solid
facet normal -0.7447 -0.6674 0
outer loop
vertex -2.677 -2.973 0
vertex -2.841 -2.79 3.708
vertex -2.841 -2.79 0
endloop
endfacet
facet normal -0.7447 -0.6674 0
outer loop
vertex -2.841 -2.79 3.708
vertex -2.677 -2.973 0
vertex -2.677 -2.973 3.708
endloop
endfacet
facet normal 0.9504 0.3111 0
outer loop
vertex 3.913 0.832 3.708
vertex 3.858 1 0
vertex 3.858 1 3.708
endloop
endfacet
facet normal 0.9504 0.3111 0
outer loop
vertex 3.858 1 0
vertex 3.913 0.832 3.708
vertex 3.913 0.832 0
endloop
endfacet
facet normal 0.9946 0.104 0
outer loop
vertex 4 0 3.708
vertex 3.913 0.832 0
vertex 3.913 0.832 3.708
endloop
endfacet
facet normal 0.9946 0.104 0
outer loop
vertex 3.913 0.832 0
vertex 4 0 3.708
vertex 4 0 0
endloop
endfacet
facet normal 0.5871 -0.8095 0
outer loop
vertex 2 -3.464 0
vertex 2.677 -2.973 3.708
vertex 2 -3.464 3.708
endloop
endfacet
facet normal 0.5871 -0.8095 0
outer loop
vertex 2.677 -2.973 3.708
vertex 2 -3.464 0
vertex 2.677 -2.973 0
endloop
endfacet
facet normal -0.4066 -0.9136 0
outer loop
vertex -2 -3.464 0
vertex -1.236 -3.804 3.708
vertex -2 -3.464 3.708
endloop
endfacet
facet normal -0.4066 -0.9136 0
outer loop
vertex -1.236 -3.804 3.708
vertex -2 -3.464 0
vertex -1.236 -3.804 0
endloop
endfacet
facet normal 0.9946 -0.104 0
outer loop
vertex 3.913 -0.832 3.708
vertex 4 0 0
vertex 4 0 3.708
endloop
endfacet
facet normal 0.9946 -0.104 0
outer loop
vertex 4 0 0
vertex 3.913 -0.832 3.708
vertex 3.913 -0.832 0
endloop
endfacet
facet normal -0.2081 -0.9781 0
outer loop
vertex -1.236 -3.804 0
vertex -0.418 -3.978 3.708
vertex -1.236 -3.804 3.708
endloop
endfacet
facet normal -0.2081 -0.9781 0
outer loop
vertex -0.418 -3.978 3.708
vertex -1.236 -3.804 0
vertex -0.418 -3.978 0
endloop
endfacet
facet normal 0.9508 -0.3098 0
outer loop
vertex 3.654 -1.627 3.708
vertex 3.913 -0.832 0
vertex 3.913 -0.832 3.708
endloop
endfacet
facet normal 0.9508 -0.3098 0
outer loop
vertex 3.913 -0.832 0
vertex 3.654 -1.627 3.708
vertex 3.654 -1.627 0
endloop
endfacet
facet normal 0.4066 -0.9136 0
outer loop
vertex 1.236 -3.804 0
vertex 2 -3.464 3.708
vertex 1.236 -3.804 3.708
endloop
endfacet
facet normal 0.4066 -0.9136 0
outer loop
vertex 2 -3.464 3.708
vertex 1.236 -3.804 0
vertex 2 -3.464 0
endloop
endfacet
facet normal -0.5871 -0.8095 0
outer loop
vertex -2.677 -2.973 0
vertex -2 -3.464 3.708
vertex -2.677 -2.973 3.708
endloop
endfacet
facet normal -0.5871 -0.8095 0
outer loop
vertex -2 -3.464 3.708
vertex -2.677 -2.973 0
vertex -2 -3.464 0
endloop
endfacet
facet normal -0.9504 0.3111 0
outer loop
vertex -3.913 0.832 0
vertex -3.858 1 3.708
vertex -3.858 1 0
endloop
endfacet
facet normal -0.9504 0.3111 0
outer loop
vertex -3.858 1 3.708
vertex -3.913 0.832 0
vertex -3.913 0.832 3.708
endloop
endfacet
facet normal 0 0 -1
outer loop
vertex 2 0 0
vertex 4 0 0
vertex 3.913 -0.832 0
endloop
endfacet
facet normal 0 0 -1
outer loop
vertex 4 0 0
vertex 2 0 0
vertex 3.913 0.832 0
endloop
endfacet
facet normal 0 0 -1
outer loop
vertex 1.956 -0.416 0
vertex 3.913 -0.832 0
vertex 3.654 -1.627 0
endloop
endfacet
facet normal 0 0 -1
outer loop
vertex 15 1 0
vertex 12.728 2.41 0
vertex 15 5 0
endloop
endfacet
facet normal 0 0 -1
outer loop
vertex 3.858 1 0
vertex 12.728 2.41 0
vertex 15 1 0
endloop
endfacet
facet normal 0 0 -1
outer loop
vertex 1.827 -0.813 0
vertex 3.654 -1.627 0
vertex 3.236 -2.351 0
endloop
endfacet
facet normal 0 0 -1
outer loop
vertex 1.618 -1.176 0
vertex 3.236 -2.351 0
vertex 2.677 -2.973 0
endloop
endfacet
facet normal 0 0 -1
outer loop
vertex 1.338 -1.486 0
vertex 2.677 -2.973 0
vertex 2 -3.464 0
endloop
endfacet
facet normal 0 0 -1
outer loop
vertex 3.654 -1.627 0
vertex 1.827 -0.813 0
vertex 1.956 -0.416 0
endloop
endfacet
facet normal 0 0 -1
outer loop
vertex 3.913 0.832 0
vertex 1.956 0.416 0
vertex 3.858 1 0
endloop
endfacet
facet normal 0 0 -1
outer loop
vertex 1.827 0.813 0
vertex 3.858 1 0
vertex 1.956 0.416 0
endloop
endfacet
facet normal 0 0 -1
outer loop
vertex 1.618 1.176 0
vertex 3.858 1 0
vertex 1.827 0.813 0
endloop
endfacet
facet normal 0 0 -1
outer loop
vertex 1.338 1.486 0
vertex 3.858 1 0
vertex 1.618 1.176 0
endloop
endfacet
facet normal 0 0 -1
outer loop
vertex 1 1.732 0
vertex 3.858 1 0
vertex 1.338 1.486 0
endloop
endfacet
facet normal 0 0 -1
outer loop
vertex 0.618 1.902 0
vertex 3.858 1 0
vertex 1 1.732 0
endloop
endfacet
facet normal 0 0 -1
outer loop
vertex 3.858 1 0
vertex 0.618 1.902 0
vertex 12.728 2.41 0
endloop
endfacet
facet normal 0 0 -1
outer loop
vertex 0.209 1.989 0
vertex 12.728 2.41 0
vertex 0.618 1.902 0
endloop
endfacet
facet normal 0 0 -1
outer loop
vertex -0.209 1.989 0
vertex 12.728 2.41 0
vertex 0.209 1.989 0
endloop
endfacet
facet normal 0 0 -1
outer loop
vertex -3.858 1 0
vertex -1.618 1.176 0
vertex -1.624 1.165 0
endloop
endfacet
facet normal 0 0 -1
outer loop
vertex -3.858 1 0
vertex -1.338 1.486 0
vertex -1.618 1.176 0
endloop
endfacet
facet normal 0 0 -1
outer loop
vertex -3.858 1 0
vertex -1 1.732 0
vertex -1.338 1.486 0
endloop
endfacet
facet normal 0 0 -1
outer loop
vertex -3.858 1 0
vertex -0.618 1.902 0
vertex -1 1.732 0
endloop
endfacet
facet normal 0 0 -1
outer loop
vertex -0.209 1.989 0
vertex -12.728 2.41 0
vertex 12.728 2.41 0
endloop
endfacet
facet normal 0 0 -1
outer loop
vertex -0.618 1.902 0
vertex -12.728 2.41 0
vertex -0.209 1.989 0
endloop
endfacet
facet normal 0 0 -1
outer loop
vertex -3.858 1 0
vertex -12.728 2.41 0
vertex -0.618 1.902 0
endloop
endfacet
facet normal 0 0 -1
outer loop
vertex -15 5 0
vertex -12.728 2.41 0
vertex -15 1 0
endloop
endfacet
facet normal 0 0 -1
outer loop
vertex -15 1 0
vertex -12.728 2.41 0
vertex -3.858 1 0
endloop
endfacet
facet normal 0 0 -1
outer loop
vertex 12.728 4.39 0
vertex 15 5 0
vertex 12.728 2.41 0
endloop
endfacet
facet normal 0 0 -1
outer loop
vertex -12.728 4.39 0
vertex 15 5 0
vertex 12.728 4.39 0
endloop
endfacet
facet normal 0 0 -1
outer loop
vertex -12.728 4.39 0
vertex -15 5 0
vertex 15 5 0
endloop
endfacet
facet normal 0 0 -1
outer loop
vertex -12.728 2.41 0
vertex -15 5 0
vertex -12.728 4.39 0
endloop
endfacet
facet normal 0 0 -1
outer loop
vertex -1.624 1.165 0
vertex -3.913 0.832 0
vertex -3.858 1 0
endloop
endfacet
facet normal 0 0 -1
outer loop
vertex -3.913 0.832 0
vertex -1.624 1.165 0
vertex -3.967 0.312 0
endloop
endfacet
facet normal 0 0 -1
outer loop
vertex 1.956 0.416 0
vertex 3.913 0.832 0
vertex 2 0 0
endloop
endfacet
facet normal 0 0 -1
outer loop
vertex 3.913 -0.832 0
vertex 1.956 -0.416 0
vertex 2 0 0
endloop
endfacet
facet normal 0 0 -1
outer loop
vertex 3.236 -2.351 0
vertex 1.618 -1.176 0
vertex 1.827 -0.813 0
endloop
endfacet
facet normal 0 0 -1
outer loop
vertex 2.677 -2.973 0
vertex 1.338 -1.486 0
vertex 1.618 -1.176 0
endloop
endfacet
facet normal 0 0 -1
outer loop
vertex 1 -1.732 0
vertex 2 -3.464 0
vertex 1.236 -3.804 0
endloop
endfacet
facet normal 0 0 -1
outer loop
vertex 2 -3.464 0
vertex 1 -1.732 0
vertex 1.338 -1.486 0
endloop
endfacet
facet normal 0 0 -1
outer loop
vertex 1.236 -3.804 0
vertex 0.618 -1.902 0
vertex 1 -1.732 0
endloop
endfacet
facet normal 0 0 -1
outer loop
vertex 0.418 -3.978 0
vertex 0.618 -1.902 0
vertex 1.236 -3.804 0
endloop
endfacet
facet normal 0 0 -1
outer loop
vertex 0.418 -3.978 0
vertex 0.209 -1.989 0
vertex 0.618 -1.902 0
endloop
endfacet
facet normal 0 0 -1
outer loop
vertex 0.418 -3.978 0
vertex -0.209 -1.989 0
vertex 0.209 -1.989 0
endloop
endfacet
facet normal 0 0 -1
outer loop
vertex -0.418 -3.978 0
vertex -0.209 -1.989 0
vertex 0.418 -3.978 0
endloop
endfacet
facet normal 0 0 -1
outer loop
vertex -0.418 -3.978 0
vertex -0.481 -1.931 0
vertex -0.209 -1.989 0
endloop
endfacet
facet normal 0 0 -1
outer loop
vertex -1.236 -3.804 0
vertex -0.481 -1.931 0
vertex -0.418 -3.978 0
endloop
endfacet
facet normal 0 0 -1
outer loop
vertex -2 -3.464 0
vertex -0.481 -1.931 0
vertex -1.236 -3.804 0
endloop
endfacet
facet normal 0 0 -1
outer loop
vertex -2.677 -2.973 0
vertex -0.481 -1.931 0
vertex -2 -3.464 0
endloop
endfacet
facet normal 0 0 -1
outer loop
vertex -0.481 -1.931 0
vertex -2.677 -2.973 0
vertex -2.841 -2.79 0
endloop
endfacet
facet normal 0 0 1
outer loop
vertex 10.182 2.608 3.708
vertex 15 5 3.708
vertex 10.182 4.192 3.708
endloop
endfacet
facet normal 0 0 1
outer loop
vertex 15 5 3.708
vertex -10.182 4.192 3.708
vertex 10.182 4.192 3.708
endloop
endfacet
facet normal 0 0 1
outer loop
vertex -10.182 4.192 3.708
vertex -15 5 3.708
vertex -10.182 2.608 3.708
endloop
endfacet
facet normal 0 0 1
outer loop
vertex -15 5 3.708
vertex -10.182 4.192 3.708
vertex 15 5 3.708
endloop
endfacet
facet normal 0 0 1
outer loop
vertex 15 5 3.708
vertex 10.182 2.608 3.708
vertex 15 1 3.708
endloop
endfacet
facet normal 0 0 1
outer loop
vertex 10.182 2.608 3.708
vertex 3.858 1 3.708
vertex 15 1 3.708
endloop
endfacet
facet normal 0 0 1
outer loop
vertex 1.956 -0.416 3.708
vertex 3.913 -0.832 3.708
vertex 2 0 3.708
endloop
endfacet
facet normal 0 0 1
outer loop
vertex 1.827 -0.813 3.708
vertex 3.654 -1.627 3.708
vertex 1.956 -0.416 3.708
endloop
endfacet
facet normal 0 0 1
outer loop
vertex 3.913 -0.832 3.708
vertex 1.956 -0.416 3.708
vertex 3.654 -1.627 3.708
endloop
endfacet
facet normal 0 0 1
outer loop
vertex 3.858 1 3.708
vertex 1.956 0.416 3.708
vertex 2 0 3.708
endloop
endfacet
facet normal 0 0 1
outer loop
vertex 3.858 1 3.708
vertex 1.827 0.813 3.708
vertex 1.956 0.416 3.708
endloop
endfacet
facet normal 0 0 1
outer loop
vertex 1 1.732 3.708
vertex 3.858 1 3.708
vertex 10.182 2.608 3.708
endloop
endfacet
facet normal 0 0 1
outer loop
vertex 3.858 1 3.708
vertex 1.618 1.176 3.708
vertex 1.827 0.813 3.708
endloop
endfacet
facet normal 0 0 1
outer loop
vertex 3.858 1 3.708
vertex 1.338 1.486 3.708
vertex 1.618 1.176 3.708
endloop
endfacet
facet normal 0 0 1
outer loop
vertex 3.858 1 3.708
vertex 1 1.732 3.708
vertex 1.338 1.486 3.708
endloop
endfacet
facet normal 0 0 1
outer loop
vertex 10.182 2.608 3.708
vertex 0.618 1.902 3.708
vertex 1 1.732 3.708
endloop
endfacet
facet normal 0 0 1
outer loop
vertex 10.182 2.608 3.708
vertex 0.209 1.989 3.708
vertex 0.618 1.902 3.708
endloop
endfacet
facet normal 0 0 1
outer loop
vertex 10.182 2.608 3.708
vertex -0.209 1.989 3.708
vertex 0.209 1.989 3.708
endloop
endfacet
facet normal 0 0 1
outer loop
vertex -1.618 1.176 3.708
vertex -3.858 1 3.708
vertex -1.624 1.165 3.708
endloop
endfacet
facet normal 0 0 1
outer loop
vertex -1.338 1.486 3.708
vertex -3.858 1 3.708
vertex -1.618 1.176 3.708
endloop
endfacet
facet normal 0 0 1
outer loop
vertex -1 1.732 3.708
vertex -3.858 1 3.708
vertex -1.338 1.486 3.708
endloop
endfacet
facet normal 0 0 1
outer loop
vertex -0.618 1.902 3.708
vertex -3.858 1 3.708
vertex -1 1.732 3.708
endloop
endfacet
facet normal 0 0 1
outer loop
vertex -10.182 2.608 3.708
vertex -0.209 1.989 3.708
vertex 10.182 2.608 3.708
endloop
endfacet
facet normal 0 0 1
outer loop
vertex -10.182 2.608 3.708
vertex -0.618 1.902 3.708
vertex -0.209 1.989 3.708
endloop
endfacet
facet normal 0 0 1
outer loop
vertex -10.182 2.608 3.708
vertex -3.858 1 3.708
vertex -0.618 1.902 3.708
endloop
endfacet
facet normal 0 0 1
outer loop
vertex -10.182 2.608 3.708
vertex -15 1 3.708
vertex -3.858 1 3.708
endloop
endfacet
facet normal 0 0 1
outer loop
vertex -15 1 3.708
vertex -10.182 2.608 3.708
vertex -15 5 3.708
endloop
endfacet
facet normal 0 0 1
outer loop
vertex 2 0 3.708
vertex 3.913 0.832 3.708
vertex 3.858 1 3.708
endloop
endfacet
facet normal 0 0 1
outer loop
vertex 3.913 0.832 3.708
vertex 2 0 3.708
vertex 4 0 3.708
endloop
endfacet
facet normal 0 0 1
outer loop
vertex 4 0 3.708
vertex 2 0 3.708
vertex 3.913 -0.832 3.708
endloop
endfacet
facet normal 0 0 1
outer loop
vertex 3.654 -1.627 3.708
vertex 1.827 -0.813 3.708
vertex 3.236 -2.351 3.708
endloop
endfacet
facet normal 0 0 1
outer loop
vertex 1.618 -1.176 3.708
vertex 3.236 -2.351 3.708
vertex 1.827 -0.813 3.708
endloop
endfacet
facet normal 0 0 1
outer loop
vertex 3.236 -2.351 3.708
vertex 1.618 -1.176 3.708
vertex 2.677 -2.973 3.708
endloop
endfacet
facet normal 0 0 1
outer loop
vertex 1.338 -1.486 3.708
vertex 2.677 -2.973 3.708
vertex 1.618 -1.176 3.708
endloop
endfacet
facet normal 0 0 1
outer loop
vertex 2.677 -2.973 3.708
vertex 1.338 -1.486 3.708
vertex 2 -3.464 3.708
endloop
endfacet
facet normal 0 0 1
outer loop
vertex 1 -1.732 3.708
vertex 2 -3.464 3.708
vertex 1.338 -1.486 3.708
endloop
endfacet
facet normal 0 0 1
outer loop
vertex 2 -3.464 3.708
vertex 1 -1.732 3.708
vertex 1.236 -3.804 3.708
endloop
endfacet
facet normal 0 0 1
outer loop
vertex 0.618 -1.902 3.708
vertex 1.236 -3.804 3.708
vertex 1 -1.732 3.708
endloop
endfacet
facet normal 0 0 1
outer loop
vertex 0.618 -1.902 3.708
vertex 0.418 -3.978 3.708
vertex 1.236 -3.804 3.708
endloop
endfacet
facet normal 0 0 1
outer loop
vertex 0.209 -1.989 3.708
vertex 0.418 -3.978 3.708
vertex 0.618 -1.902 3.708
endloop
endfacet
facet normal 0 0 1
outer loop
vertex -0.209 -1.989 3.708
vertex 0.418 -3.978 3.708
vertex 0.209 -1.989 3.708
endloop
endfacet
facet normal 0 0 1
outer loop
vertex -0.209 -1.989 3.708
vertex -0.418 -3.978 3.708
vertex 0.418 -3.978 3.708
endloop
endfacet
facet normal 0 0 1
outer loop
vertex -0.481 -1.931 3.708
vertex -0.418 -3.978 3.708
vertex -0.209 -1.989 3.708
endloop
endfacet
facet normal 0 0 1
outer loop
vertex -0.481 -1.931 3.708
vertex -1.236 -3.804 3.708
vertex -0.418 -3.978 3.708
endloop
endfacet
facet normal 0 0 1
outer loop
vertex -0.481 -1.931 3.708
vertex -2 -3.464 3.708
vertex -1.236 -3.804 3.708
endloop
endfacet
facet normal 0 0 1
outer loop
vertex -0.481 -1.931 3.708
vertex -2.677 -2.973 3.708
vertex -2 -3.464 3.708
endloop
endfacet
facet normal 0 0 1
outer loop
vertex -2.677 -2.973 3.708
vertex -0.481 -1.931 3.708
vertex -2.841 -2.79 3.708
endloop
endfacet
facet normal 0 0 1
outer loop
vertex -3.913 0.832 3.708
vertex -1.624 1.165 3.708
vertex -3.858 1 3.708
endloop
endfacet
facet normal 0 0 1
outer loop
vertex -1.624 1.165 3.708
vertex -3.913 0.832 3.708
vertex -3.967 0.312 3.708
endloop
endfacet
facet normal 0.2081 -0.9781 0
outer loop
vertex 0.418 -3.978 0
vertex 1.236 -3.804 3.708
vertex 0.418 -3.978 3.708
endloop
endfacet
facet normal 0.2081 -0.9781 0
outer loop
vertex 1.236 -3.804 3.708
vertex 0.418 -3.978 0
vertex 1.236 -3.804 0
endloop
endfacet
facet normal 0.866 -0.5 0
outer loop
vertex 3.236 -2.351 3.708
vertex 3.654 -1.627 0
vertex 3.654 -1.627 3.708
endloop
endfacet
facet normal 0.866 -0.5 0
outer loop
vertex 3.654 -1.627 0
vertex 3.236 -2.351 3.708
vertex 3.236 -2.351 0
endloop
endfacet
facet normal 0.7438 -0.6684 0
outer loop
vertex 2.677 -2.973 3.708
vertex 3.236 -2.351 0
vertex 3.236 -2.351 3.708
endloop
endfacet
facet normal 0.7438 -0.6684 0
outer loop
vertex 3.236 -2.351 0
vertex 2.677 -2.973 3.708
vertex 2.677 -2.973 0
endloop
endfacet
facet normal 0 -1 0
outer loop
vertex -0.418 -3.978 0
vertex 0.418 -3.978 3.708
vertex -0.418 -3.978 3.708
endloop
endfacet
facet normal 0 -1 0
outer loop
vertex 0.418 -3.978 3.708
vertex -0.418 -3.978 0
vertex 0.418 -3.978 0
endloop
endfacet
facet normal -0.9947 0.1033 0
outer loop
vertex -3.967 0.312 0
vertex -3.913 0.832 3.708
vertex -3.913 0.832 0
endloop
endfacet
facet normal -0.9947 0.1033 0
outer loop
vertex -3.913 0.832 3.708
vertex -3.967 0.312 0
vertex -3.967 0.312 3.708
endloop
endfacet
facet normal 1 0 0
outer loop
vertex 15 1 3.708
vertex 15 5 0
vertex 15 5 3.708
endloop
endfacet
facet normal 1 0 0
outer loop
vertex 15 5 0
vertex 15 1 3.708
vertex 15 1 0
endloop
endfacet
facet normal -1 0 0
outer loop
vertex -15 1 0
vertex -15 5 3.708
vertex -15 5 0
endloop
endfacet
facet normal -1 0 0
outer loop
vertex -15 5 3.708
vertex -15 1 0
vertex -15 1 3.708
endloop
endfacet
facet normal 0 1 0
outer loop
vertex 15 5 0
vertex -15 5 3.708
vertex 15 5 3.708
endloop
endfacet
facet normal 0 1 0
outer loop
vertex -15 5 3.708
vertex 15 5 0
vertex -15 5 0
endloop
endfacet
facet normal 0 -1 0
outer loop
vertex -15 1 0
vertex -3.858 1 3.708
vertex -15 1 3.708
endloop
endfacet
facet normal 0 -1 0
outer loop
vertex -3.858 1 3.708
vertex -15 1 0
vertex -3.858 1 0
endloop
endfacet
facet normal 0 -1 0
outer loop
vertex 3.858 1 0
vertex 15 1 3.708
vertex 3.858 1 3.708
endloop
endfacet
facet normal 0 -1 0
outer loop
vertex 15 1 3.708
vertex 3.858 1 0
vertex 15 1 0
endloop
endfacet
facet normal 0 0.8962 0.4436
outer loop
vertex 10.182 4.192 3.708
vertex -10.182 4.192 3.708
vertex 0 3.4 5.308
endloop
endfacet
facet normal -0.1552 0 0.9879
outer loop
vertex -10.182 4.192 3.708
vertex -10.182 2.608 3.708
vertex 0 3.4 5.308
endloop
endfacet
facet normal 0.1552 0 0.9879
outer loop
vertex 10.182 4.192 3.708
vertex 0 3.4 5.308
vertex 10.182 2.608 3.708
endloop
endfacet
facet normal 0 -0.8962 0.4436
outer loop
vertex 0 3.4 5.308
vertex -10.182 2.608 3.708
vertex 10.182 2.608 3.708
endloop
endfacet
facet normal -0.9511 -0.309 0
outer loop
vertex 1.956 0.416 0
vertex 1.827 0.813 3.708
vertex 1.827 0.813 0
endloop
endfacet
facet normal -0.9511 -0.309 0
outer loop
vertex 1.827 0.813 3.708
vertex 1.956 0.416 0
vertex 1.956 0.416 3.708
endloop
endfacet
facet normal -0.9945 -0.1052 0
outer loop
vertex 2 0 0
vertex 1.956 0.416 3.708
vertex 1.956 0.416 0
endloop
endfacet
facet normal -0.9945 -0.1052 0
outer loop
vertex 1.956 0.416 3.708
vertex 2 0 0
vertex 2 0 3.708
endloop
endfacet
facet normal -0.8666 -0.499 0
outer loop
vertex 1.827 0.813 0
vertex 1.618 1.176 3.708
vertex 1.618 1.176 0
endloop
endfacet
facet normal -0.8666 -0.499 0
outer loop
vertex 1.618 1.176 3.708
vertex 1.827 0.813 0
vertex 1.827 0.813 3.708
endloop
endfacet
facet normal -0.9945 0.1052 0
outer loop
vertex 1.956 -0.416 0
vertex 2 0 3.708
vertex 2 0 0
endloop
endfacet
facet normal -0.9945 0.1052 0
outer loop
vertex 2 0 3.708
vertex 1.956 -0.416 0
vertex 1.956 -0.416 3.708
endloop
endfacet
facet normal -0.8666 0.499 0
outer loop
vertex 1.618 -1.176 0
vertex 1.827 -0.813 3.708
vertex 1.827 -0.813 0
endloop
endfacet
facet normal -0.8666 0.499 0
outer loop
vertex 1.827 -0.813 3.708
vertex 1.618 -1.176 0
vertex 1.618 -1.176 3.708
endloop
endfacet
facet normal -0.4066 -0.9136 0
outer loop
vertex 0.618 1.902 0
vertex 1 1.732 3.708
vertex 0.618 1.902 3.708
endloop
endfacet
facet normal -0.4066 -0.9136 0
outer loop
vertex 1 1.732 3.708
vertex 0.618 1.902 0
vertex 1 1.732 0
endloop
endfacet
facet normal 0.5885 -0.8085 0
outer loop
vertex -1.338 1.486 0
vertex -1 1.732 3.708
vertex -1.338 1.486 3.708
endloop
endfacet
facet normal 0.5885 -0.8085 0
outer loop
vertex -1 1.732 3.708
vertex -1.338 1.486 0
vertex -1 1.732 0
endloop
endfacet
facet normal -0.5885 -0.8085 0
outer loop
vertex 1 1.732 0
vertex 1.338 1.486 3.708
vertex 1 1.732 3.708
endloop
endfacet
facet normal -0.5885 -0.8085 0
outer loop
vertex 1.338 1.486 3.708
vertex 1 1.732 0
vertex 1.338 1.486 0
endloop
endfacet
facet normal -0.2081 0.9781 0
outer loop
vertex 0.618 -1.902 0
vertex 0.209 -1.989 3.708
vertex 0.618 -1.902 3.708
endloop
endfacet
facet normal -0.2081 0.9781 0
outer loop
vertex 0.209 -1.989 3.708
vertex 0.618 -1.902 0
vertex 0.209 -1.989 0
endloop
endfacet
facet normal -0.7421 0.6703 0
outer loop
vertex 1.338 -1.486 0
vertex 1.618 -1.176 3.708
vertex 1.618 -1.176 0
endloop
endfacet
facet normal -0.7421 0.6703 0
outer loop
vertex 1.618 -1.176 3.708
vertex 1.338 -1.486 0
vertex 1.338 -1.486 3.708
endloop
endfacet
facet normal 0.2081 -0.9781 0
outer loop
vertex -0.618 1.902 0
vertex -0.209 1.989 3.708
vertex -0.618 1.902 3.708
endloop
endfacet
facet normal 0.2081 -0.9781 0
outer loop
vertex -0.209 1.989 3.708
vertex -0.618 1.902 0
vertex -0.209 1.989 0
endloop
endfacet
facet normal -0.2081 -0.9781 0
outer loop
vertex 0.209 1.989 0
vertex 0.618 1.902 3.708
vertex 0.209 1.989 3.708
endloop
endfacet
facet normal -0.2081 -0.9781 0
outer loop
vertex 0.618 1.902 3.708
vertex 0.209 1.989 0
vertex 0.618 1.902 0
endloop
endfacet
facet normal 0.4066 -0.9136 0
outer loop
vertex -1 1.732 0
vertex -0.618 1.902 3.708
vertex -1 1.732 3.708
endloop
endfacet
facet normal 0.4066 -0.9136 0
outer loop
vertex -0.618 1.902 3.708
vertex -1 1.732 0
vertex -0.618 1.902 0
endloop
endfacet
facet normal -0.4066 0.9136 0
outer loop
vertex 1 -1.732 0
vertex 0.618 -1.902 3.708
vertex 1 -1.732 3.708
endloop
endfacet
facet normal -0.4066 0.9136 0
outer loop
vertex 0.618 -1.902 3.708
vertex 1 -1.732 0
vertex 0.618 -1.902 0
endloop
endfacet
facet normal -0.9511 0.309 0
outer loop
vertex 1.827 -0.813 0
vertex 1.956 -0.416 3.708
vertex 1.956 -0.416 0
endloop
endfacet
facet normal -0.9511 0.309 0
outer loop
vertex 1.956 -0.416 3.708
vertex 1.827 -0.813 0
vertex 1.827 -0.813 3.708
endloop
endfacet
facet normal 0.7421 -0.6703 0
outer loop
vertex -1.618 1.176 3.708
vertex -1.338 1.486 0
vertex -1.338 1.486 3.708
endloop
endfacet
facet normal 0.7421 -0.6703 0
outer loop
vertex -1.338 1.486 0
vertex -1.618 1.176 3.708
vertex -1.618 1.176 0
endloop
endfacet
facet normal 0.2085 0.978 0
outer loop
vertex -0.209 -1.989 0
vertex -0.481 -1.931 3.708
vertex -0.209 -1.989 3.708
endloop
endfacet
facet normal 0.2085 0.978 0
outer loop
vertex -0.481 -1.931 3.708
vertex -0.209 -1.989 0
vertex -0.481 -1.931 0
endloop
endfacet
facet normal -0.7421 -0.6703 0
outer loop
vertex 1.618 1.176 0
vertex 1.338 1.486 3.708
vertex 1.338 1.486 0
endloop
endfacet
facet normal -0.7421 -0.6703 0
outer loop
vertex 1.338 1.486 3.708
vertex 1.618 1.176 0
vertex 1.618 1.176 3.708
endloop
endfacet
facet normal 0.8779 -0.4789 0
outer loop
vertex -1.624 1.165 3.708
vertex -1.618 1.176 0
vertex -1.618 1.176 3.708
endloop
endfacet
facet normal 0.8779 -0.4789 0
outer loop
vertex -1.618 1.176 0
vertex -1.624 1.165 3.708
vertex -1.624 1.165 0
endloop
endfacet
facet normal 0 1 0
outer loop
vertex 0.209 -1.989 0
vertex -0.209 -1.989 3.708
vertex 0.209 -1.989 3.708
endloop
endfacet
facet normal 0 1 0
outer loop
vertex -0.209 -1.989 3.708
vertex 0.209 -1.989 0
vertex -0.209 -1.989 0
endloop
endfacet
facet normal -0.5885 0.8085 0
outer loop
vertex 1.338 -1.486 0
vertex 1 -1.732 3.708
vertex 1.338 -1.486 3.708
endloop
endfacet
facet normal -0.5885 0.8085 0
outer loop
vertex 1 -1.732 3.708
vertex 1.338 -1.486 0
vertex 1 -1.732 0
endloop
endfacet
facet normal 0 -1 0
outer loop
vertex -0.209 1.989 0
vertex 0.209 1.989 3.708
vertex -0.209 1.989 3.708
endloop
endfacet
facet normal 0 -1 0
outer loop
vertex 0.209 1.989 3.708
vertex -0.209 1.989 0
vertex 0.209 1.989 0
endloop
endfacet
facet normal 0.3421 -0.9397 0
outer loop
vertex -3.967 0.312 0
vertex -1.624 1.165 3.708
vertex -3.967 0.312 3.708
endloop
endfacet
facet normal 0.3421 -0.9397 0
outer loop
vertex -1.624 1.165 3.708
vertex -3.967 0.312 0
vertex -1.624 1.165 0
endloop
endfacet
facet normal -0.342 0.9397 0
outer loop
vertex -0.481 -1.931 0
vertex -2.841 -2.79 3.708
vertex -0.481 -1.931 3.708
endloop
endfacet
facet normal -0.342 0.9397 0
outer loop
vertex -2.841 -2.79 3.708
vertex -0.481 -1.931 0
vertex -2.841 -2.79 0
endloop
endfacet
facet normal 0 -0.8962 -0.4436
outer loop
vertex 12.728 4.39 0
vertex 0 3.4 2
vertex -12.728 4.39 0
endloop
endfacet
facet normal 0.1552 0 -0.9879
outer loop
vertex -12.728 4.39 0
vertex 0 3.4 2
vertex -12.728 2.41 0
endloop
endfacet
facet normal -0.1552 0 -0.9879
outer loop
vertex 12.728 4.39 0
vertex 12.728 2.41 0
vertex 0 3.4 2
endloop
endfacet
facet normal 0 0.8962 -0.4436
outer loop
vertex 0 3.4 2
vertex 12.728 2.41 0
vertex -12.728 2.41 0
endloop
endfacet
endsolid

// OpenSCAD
fs=0.01; 
//arbitrary
width=30;
//golden ratio
total_height=width/1.618;
//for rainbow flag: all stripes total_height/6 
//for bi flag: center stipe: total_height * 0.2; top/bottom stripes: total_height * 0.4
height=total_height * 0.2;
//1=top piece, 2=middle piece, 3=🥺 piece
piece_type=2;
//which strap to clip on; 1: left, 2: right
side=1;
difference() {
difference() {
    union() {
        cylinder(h=height,r1=8/2, r2=8/2,$fs=fs);
        translate([0,3,height/2]) cube([width,4,height], center=true);
        if (piece_type!=1) translate([0,3.4,height-0.4]) scale([6*(width/20),0.7,1]) rotate([0,0,45]) cylinder(2,2,0,$fn=4);
    }
    union() {
        cylinder(h=30,r1=4/2, r2=4/2,$fs=fs);
        rotate([0,0,20 + (side == 2 ? 140 : 0)]) translate([-2,0,height/2]) cube([5,3.3,height],center=true);
    }
};
 if (piece_type!=3) translate([0,3.4,0]) scale([6*(width/20),0.7,1]) rotate([0,0,45]) cylinder(2,2,0,$fn=4);
};
